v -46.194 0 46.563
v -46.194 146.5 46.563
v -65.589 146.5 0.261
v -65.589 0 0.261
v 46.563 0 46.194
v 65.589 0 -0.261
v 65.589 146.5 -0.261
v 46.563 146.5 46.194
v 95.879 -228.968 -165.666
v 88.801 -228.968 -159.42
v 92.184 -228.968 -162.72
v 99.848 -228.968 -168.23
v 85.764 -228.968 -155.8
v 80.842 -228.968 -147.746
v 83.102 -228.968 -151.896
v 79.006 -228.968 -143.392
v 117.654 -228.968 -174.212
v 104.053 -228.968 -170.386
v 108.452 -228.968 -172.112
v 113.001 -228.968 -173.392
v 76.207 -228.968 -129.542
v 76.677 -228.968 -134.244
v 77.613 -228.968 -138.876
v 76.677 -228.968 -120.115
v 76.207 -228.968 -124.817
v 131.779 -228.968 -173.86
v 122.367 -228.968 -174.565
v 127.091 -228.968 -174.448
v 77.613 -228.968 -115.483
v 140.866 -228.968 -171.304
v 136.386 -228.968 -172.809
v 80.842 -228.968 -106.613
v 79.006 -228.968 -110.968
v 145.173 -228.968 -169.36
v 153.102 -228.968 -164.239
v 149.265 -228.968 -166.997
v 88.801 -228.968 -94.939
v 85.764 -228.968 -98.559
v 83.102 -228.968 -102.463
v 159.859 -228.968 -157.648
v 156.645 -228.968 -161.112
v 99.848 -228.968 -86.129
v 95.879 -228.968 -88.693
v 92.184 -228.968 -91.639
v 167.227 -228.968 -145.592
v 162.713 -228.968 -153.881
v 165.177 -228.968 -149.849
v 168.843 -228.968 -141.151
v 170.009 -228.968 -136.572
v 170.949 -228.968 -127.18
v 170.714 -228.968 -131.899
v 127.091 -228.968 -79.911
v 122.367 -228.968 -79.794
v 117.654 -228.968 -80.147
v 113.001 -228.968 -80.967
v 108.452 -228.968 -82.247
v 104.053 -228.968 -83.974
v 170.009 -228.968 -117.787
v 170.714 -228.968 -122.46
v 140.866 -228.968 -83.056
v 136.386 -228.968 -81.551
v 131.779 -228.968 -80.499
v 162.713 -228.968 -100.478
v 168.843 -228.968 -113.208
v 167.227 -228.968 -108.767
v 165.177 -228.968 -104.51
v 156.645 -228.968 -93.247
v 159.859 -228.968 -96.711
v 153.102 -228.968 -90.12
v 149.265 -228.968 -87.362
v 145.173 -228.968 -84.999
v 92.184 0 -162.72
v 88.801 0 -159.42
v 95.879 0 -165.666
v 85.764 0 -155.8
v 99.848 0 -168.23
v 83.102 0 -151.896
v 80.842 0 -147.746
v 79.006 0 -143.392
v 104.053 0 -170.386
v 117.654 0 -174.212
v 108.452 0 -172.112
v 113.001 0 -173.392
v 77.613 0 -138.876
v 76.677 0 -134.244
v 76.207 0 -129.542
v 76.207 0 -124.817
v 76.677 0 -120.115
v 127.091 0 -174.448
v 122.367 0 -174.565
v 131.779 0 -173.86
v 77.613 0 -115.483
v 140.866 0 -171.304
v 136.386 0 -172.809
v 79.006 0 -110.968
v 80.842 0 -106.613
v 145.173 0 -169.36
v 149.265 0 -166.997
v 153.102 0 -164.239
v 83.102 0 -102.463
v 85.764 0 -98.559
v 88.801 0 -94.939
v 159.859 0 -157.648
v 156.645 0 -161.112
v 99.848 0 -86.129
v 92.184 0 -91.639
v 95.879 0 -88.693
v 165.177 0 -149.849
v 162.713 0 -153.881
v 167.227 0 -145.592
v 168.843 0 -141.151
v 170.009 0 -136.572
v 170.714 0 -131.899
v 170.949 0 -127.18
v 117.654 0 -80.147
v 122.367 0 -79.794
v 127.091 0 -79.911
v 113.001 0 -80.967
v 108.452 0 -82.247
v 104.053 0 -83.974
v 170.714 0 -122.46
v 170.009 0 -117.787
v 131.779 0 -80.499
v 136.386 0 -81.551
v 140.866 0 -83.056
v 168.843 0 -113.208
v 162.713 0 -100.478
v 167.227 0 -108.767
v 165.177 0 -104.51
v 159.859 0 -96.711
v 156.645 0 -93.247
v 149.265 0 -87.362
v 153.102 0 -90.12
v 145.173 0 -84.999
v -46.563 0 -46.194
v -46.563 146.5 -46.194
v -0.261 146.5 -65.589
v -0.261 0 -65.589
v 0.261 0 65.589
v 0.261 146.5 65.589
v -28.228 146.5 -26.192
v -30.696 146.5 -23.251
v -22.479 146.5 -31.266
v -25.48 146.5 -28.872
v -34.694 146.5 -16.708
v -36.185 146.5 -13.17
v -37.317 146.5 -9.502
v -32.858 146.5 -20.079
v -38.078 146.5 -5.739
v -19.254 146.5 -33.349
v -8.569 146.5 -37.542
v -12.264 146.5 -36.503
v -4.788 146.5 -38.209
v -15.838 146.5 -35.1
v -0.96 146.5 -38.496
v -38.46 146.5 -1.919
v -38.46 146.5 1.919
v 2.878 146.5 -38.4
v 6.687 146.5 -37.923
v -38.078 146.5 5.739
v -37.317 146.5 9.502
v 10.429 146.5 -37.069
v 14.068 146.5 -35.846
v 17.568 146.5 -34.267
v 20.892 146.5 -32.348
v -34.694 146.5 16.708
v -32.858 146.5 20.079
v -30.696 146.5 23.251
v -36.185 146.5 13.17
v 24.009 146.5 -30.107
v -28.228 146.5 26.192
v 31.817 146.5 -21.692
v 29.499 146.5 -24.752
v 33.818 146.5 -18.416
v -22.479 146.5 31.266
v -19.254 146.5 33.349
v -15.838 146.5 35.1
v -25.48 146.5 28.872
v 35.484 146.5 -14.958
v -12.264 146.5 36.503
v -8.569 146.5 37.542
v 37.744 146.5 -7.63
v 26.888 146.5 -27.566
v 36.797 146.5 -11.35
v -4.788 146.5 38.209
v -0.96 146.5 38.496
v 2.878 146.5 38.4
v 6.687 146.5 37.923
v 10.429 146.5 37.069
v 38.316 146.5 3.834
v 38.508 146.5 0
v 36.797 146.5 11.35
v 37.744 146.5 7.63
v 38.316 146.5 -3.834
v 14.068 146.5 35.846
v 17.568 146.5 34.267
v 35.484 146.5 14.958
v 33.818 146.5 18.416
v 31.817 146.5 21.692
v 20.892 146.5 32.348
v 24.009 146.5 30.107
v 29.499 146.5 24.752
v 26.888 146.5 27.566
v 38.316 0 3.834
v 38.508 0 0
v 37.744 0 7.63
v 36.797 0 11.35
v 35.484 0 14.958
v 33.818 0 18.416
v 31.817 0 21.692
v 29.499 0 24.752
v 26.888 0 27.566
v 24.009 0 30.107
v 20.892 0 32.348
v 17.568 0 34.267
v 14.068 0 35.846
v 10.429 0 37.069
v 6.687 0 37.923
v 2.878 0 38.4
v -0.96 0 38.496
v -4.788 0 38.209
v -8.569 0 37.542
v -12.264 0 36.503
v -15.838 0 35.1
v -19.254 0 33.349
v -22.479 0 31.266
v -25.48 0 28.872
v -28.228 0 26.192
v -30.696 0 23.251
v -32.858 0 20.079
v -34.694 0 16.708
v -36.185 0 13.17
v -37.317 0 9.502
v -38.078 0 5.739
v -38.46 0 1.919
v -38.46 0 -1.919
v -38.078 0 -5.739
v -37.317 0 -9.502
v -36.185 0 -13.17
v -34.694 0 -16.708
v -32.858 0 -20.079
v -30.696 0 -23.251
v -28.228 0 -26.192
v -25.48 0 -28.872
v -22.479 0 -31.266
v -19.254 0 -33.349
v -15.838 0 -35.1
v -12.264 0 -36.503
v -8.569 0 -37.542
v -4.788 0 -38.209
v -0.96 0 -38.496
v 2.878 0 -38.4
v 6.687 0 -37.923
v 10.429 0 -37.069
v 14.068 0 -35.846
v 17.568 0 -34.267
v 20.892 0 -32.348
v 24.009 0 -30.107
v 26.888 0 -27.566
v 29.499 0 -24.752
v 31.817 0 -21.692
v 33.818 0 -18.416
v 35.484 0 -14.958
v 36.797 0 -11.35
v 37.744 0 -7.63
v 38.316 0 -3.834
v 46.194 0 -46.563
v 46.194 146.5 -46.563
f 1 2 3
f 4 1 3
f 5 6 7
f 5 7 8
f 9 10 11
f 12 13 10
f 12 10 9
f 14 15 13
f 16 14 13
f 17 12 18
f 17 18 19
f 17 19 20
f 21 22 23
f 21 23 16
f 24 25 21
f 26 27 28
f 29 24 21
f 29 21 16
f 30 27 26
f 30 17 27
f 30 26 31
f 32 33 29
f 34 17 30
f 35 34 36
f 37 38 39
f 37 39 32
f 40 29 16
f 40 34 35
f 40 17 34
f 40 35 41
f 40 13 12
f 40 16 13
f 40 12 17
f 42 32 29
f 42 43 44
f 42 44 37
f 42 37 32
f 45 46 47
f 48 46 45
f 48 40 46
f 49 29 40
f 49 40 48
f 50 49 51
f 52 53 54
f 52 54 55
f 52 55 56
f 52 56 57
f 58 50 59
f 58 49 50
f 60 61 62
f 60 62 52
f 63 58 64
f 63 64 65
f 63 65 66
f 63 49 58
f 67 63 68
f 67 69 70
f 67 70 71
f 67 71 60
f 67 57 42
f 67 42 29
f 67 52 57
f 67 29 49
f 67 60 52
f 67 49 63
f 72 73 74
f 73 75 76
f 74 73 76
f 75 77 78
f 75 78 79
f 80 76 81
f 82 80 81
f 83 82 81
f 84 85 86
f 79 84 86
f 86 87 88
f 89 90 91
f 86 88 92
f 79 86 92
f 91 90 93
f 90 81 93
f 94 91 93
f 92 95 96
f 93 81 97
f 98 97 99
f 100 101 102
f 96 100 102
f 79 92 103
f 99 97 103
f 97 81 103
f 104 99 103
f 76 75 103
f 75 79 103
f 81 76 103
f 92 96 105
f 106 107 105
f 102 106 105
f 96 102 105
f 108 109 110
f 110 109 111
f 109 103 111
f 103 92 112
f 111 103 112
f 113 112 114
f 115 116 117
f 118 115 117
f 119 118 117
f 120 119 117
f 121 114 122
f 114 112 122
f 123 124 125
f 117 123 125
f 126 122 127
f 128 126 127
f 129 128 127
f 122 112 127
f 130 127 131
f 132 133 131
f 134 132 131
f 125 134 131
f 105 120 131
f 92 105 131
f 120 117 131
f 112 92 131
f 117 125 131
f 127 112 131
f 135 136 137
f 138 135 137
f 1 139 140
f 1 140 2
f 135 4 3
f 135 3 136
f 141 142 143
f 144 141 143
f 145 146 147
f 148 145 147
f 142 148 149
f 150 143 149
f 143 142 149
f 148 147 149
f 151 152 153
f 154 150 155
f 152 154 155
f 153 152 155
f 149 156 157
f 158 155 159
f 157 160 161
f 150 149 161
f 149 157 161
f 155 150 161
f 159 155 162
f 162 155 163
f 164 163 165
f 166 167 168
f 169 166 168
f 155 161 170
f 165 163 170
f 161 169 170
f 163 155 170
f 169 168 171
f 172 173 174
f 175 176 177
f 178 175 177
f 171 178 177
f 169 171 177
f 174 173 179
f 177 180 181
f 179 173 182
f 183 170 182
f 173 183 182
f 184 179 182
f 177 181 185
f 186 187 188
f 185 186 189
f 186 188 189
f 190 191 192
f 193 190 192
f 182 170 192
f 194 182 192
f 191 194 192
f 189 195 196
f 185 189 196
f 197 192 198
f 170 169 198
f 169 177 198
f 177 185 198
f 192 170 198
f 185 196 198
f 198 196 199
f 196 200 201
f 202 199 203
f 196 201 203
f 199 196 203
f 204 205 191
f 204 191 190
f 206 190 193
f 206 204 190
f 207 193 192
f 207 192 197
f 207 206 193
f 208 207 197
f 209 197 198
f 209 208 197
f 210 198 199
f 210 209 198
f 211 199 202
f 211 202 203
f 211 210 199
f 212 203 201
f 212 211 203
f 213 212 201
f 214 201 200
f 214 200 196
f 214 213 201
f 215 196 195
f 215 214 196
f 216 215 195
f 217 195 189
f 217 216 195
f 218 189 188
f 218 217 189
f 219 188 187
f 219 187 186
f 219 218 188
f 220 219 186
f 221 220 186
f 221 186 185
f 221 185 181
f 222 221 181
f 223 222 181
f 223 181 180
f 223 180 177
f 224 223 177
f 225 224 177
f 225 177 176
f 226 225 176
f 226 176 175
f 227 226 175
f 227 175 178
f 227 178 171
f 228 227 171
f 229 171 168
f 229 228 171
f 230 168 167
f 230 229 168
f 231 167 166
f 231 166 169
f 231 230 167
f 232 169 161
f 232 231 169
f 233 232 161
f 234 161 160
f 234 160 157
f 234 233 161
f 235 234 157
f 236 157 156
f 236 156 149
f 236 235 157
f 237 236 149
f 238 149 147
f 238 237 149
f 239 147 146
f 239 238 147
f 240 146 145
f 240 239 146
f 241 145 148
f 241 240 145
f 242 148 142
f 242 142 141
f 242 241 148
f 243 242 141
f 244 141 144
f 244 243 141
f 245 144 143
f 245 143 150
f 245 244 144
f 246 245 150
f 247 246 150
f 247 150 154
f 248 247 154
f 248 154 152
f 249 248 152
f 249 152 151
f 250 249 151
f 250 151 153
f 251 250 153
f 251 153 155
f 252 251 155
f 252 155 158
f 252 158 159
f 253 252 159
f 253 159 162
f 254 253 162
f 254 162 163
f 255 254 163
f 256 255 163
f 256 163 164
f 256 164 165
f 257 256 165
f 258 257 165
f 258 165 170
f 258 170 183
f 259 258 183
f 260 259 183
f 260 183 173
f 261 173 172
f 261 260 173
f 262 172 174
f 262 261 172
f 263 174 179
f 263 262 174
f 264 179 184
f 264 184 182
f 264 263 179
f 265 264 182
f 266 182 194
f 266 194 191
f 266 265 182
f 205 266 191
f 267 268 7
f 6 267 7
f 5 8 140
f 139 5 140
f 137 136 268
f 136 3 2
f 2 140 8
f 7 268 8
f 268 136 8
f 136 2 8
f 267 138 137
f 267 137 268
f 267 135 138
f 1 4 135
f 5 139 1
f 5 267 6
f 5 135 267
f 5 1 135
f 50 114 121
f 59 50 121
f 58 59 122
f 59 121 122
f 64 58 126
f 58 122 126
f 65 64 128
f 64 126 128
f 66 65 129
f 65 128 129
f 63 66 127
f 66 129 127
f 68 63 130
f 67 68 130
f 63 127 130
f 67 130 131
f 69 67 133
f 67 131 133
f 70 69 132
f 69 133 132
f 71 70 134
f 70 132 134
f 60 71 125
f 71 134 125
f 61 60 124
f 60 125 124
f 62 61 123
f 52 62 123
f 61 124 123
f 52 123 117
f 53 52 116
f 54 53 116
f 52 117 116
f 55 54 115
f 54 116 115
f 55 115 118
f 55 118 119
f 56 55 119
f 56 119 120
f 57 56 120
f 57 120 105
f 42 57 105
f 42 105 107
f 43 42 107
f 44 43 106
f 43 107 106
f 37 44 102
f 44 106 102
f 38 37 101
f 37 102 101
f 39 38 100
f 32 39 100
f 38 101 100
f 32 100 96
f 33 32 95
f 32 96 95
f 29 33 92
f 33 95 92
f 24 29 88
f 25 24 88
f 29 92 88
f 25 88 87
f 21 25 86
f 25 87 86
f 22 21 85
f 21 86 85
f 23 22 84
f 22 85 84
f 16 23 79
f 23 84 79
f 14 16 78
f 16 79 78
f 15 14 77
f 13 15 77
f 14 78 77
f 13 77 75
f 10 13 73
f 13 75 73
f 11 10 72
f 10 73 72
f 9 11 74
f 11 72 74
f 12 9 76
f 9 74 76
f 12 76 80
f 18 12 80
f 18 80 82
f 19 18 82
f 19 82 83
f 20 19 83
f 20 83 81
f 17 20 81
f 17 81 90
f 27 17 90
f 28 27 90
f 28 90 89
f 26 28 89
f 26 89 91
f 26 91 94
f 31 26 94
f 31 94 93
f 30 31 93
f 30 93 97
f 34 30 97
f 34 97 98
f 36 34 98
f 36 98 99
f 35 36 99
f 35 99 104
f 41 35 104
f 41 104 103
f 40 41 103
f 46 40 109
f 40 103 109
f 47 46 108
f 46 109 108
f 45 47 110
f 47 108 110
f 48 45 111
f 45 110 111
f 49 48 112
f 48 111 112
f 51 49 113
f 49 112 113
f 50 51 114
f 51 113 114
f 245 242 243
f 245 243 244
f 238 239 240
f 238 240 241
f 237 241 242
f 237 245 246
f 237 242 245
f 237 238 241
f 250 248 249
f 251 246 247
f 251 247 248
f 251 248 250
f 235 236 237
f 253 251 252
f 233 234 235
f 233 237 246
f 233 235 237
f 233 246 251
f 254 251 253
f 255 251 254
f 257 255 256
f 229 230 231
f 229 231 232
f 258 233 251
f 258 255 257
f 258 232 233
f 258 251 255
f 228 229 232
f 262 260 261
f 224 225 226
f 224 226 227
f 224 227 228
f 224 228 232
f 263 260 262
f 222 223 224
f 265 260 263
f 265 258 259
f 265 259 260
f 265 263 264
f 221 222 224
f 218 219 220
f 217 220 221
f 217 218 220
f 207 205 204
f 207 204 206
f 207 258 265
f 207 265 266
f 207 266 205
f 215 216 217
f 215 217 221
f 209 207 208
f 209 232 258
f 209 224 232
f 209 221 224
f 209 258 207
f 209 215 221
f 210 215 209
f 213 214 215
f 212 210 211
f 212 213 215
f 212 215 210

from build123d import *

# Parameters (mm, degrees)
F2_R     = 47.4006605725
F3_DEPTH = 228.9681136608
F1_R     = 38.5077720906
F4_DEPTH = 146.4996039867


with BuildPart() as f3:
    # F2 (on Front) → F3 (new body)
    with BuildSketch(Plane.XZ):
        with Locations((123.5484033823, -127.1795481443)):
            Circle(F2_R)
    extrude(amount=F3_DEPTH)


with BuildPart() as f4:
    # F1 (on Front) → F4 (new body)
    with BuildSketch(Plane.XZ):
        Circle(F1_R)
    extrude(amount=-F4_DEPTH)


with BuildPart() as f4b:
    # F0 (on Front) → F4, piece 2 (new body)
    with BuildSketch(Plane.XZ):
        Polygon((0.2612999241, 65.5892101439), (-46.1938083172, 46.5633422136), (-65.5892101439, 0.2612999241), (-46.5633422136, -46.1938083172), (-0.2612999241, -65.5892101439), (46.1938083172, -46.5633422136), (65.5892101439, -0.2612999241), (46.5633422136, 46.1938083172), align=None)
    extrude(amount=-F4_DEPTH)


solid = Compound([f3.part, f4.part, f4b.part])
